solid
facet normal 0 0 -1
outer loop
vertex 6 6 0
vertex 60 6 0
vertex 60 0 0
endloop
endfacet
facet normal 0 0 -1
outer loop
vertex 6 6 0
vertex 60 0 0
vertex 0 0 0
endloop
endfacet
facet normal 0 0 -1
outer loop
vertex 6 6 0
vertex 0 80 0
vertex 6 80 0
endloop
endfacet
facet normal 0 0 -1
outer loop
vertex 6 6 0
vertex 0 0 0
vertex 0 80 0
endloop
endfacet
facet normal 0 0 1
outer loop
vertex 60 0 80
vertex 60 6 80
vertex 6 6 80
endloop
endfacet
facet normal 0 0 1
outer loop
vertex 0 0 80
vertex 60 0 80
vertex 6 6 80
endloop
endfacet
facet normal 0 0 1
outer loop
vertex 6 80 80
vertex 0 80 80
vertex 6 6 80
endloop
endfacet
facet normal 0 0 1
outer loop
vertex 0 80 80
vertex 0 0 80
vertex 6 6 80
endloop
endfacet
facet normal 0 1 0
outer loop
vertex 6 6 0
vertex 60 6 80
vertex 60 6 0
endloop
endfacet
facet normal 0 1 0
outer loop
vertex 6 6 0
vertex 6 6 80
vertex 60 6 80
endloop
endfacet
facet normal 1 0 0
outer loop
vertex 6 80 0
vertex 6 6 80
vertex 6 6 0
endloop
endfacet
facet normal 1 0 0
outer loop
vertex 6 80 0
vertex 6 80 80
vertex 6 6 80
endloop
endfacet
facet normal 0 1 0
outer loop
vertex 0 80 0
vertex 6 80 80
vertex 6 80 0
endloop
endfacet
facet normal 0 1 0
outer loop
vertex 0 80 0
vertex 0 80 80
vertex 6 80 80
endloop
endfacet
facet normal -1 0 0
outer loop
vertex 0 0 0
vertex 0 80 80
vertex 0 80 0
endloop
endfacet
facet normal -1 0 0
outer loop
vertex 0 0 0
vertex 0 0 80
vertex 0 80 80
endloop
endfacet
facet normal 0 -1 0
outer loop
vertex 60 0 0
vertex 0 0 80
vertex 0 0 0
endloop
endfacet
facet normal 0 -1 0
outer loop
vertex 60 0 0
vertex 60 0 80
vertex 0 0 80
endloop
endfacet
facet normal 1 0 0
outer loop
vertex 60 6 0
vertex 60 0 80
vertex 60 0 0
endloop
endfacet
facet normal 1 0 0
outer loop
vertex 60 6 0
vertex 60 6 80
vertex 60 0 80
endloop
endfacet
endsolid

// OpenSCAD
$fn = 32;

// ----------------------------------------------------------------------
// Structural section: angle 60 x 80 mm
// ----------------------------------------------------------------------

// --- parameters (mm) ---
sec_w = 60;               // leg width, X
sec_h = 80;               // leg height, Y
flange_t = 6;             // leg thickness
plate_t = 80;             // cut length, Z (extrusion height)

profile = [[0, 0], [60, 0], [60, 6], [6, 6], [6, 80], [0, 80]];  // primary outline, 6 points, counter clockwise

// --- the one profile operation ---
linear_extrude(height = plate_t) polygon(points = profile);
